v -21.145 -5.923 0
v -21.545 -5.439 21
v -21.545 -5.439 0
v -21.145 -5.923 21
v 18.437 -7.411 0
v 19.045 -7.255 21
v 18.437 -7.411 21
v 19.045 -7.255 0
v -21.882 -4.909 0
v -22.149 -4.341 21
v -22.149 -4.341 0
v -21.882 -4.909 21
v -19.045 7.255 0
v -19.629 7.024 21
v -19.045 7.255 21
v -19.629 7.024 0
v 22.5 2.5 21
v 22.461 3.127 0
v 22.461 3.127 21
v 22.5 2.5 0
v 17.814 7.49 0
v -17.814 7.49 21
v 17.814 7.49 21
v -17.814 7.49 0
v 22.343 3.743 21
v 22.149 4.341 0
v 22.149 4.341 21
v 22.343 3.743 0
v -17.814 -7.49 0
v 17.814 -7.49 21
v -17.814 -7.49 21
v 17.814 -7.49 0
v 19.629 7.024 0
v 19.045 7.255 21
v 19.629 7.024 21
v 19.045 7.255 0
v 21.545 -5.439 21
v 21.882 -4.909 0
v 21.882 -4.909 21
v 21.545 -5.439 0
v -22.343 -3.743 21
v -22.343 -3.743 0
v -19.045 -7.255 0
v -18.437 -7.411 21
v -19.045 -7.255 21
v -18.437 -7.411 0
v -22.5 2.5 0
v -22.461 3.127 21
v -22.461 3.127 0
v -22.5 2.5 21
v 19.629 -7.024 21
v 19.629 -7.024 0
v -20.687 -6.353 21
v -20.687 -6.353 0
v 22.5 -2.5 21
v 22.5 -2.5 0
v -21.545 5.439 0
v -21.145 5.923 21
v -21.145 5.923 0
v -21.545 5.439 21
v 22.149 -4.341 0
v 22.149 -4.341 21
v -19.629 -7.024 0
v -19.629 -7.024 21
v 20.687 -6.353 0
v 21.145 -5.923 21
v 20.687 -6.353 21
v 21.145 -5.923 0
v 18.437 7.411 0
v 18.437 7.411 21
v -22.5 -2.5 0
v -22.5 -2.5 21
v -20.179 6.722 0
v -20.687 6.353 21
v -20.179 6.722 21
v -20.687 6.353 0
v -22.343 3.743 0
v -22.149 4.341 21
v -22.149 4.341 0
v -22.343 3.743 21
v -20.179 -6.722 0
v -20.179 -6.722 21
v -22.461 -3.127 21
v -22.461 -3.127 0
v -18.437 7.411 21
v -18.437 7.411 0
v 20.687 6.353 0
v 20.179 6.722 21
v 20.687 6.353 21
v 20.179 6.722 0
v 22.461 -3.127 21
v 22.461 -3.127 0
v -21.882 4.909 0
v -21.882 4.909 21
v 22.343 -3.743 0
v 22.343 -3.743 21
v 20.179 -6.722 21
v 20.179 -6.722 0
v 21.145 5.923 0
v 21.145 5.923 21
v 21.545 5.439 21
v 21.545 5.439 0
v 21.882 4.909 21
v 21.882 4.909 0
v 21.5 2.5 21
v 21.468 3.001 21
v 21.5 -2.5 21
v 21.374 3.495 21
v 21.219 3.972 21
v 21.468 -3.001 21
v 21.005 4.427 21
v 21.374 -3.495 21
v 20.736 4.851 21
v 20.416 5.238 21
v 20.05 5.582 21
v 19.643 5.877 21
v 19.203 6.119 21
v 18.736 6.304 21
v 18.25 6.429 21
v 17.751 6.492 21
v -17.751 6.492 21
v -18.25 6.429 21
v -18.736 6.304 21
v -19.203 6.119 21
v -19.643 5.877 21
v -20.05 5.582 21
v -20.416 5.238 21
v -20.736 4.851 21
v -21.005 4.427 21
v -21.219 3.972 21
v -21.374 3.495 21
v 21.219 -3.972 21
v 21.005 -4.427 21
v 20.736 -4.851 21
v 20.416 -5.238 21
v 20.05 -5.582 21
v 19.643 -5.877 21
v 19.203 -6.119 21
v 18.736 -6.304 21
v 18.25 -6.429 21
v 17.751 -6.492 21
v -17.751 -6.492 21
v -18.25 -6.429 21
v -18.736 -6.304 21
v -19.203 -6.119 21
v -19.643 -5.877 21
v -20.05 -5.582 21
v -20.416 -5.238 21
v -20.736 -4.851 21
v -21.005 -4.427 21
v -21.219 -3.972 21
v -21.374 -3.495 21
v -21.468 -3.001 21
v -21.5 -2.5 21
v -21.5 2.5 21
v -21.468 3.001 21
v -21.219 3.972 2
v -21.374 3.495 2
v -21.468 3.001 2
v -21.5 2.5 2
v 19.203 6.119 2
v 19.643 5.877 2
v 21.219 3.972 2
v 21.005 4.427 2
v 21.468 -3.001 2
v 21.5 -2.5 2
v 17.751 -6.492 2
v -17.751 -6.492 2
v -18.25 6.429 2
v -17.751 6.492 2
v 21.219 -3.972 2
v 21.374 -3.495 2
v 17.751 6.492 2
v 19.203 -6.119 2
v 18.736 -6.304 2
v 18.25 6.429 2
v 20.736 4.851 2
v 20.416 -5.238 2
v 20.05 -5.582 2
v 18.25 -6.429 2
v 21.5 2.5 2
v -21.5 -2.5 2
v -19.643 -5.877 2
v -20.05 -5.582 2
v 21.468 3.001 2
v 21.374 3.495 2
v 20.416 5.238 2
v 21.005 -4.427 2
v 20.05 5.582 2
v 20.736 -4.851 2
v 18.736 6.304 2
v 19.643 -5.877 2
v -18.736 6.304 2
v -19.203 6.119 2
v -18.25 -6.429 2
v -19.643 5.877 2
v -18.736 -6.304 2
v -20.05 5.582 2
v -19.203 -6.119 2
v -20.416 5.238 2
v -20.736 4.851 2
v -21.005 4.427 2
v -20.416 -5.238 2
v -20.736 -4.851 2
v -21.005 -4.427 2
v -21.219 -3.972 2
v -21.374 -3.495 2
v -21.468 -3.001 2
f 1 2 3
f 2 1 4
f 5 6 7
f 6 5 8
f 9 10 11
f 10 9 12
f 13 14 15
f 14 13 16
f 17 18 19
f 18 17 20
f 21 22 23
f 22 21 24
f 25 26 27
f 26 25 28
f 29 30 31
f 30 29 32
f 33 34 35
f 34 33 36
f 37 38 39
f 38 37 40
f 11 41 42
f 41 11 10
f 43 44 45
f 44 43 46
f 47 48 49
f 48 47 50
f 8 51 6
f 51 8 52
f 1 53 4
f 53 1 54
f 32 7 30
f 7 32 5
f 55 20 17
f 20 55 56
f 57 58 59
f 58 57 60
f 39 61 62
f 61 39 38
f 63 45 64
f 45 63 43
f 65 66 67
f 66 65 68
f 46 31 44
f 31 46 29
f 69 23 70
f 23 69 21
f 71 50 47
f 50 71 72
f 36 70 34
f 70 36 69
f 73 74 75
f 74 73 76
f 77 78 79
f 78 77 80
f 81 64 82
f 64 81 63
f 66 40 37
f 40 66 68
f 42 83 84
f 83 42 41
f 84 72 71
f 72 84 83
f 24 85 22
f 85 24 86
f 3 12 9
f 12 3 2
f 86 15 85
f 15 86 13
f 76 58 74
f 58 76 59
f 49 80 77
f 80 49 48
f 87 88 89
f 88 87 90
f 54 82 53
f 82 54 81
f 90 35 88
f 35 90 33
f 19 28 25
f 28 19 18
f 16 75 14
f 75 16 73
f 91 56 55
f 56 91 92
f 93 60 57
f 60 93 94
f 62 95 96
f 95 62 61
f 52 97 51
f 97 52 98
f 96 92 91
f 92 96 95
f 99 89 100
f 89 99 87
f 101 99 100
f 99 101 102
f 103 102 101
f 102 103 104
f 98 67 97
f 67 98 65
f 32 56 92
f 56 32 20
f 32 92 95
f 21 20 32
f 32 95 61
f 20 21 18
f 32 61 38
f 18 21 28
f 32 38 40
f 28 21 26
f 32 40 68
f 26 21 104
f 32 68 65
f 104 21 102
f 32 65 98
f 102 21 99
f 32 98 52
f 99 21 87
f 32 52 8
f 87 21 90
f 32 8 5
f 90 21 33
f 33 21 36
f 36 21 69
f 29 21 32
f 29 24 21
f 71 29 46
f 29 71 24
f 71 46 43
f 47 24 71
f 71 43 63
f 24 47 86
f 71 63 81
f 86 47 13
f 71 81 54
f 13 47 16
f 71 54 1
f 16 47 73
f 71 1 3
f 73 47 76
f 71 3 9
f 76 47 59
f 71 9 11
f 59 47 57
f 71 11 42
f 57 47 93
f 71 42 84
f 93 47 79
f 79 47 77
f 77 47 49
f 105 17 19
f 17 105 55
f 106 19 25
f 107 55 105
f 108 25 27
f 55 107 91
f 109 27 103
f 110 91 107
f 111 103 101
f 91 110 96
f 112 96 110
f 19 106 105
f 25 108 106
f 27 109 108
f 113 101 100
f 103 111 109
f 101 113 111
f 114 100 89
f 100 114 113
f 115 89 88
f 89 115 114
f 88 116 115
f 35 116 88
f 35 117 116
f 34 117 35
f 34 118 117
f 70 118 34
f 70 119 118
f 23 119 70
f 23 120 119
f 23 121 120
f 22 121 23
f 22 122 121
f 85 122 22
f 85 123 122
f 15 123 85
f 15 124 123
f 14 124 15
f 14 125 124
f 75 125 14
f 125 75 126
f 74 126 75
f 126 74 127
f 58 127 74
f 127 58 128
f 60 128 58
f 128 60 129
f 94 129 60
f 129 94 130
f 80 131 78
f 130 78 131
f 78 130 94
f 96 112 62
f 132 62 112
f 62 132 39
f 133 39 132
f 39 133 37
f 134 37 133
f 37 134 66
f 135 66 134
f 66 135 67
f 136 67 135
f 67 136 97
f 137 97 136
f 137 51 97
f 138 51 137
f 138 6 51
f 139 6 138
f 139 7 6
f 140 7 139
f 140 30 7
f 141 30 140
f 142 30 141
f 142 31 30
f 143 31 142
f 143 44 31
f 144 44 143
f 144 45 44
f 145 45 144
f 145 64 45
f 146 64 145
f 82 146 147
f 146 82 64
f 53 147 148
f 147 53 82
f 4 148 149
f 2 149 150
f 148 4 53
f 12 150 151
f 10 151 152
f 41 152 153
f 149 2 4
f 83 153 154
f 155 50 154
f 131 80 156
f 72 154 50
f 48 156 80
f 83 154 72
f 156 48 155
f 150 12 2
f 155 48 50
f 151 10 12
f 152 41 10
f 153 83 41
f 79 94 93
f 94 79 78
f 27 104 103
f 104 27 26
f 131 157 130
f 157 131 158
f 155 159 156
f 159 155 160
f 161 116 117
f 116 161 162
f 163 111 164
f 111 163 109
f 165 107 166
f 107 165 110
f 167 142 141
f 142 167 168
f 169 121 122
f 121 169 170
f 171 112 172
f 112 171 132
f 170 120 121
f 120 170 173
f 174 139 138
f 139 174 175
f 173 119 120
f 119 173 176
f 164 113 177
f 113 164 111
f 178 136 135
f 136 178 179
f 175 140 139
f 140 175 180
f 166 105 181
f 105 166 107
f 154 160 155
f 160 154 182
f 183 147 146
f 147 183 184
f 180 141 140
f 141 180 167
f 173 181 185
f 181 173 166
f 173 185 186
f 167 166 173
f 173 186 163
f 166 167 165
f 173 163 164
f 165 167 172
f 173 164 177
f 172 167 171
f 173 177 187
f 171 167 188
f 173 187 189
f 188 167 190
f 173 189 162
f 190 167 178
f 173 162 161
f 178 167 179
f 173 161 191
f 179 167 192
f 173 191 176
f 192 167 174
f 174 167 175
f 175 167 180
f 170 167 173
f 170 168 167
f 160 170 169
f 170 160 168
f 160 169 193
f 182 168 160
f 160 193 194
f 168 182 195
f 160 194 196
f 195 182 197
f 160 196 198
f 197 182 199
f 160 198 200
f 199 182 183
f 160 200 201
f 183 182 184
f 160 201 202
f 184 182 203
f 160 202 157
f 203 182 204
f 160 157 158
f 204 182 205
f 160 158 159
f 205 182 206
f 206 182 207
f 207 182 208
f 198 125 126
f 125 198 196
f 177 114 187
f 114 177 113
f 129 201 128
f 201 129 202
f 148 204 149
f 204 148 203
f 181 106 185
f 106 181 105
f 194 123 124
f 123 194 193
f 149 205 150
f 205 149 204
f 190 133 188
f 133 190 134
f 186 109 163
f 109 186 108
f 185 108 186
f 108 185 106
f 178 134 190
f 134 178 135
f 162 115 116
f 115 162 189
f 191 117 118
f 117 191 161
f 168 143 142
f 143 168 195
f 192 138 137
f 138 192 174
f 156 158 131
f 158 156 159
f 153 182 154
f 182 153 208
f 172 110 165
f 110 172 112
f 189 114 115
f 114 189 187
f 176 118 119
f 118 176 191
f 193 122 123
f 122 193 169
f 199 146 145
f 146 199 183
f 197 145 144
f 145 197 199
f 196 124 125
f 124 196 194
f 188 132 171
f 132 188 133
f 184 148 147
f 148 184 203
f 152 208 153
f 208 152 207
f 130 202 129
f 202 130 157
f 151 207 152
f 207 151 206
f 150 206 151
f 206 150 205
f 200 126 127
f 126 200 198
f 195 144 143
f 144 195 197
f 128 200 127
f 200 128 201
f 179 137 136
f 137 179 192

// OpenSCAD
$fn = 50;


difference() {
	union() {
		hull() {
			translate(v = [-17.5000000000, 2.5000000000, 0]) {
				cylinder(h = 21, r = 5);
			}
			translate(v = [17.5000000000, 2.5000000000, 0]) {
				cylinder(h = 21, r = 5);
			}
			translate(v = [-17.5000000000, -2.5000000000, 0]) {
				cylinder(h = 21, r = 5);
			}
			translate(v = [17.5000000000, -2.5000000000, 0]) {
				cylinder(h = 21, r = 5);
			}
		}
	}
	union() {
		translate(v = [0, 0, 2]) {
			hull() {
				translate(v = [-17.5000000000, 2.5000000000, 0]) {
					cylinder(h = 19, r = 4);
				}
				translate(v = [17.5000000000, 2.5000000000, 0]) {
					cylinder(h = 19, r = 4);
				}
				translate(v = [-17.5000000000, -2.5000000000, 0]) {
					cylinder(h = 19, r = 4);
				}
				translate(v = [17.5000000000, -2.5000000000, 0]) {
					cylinder(h = 19, r = 4);
				}
			}
		}
	}
}
